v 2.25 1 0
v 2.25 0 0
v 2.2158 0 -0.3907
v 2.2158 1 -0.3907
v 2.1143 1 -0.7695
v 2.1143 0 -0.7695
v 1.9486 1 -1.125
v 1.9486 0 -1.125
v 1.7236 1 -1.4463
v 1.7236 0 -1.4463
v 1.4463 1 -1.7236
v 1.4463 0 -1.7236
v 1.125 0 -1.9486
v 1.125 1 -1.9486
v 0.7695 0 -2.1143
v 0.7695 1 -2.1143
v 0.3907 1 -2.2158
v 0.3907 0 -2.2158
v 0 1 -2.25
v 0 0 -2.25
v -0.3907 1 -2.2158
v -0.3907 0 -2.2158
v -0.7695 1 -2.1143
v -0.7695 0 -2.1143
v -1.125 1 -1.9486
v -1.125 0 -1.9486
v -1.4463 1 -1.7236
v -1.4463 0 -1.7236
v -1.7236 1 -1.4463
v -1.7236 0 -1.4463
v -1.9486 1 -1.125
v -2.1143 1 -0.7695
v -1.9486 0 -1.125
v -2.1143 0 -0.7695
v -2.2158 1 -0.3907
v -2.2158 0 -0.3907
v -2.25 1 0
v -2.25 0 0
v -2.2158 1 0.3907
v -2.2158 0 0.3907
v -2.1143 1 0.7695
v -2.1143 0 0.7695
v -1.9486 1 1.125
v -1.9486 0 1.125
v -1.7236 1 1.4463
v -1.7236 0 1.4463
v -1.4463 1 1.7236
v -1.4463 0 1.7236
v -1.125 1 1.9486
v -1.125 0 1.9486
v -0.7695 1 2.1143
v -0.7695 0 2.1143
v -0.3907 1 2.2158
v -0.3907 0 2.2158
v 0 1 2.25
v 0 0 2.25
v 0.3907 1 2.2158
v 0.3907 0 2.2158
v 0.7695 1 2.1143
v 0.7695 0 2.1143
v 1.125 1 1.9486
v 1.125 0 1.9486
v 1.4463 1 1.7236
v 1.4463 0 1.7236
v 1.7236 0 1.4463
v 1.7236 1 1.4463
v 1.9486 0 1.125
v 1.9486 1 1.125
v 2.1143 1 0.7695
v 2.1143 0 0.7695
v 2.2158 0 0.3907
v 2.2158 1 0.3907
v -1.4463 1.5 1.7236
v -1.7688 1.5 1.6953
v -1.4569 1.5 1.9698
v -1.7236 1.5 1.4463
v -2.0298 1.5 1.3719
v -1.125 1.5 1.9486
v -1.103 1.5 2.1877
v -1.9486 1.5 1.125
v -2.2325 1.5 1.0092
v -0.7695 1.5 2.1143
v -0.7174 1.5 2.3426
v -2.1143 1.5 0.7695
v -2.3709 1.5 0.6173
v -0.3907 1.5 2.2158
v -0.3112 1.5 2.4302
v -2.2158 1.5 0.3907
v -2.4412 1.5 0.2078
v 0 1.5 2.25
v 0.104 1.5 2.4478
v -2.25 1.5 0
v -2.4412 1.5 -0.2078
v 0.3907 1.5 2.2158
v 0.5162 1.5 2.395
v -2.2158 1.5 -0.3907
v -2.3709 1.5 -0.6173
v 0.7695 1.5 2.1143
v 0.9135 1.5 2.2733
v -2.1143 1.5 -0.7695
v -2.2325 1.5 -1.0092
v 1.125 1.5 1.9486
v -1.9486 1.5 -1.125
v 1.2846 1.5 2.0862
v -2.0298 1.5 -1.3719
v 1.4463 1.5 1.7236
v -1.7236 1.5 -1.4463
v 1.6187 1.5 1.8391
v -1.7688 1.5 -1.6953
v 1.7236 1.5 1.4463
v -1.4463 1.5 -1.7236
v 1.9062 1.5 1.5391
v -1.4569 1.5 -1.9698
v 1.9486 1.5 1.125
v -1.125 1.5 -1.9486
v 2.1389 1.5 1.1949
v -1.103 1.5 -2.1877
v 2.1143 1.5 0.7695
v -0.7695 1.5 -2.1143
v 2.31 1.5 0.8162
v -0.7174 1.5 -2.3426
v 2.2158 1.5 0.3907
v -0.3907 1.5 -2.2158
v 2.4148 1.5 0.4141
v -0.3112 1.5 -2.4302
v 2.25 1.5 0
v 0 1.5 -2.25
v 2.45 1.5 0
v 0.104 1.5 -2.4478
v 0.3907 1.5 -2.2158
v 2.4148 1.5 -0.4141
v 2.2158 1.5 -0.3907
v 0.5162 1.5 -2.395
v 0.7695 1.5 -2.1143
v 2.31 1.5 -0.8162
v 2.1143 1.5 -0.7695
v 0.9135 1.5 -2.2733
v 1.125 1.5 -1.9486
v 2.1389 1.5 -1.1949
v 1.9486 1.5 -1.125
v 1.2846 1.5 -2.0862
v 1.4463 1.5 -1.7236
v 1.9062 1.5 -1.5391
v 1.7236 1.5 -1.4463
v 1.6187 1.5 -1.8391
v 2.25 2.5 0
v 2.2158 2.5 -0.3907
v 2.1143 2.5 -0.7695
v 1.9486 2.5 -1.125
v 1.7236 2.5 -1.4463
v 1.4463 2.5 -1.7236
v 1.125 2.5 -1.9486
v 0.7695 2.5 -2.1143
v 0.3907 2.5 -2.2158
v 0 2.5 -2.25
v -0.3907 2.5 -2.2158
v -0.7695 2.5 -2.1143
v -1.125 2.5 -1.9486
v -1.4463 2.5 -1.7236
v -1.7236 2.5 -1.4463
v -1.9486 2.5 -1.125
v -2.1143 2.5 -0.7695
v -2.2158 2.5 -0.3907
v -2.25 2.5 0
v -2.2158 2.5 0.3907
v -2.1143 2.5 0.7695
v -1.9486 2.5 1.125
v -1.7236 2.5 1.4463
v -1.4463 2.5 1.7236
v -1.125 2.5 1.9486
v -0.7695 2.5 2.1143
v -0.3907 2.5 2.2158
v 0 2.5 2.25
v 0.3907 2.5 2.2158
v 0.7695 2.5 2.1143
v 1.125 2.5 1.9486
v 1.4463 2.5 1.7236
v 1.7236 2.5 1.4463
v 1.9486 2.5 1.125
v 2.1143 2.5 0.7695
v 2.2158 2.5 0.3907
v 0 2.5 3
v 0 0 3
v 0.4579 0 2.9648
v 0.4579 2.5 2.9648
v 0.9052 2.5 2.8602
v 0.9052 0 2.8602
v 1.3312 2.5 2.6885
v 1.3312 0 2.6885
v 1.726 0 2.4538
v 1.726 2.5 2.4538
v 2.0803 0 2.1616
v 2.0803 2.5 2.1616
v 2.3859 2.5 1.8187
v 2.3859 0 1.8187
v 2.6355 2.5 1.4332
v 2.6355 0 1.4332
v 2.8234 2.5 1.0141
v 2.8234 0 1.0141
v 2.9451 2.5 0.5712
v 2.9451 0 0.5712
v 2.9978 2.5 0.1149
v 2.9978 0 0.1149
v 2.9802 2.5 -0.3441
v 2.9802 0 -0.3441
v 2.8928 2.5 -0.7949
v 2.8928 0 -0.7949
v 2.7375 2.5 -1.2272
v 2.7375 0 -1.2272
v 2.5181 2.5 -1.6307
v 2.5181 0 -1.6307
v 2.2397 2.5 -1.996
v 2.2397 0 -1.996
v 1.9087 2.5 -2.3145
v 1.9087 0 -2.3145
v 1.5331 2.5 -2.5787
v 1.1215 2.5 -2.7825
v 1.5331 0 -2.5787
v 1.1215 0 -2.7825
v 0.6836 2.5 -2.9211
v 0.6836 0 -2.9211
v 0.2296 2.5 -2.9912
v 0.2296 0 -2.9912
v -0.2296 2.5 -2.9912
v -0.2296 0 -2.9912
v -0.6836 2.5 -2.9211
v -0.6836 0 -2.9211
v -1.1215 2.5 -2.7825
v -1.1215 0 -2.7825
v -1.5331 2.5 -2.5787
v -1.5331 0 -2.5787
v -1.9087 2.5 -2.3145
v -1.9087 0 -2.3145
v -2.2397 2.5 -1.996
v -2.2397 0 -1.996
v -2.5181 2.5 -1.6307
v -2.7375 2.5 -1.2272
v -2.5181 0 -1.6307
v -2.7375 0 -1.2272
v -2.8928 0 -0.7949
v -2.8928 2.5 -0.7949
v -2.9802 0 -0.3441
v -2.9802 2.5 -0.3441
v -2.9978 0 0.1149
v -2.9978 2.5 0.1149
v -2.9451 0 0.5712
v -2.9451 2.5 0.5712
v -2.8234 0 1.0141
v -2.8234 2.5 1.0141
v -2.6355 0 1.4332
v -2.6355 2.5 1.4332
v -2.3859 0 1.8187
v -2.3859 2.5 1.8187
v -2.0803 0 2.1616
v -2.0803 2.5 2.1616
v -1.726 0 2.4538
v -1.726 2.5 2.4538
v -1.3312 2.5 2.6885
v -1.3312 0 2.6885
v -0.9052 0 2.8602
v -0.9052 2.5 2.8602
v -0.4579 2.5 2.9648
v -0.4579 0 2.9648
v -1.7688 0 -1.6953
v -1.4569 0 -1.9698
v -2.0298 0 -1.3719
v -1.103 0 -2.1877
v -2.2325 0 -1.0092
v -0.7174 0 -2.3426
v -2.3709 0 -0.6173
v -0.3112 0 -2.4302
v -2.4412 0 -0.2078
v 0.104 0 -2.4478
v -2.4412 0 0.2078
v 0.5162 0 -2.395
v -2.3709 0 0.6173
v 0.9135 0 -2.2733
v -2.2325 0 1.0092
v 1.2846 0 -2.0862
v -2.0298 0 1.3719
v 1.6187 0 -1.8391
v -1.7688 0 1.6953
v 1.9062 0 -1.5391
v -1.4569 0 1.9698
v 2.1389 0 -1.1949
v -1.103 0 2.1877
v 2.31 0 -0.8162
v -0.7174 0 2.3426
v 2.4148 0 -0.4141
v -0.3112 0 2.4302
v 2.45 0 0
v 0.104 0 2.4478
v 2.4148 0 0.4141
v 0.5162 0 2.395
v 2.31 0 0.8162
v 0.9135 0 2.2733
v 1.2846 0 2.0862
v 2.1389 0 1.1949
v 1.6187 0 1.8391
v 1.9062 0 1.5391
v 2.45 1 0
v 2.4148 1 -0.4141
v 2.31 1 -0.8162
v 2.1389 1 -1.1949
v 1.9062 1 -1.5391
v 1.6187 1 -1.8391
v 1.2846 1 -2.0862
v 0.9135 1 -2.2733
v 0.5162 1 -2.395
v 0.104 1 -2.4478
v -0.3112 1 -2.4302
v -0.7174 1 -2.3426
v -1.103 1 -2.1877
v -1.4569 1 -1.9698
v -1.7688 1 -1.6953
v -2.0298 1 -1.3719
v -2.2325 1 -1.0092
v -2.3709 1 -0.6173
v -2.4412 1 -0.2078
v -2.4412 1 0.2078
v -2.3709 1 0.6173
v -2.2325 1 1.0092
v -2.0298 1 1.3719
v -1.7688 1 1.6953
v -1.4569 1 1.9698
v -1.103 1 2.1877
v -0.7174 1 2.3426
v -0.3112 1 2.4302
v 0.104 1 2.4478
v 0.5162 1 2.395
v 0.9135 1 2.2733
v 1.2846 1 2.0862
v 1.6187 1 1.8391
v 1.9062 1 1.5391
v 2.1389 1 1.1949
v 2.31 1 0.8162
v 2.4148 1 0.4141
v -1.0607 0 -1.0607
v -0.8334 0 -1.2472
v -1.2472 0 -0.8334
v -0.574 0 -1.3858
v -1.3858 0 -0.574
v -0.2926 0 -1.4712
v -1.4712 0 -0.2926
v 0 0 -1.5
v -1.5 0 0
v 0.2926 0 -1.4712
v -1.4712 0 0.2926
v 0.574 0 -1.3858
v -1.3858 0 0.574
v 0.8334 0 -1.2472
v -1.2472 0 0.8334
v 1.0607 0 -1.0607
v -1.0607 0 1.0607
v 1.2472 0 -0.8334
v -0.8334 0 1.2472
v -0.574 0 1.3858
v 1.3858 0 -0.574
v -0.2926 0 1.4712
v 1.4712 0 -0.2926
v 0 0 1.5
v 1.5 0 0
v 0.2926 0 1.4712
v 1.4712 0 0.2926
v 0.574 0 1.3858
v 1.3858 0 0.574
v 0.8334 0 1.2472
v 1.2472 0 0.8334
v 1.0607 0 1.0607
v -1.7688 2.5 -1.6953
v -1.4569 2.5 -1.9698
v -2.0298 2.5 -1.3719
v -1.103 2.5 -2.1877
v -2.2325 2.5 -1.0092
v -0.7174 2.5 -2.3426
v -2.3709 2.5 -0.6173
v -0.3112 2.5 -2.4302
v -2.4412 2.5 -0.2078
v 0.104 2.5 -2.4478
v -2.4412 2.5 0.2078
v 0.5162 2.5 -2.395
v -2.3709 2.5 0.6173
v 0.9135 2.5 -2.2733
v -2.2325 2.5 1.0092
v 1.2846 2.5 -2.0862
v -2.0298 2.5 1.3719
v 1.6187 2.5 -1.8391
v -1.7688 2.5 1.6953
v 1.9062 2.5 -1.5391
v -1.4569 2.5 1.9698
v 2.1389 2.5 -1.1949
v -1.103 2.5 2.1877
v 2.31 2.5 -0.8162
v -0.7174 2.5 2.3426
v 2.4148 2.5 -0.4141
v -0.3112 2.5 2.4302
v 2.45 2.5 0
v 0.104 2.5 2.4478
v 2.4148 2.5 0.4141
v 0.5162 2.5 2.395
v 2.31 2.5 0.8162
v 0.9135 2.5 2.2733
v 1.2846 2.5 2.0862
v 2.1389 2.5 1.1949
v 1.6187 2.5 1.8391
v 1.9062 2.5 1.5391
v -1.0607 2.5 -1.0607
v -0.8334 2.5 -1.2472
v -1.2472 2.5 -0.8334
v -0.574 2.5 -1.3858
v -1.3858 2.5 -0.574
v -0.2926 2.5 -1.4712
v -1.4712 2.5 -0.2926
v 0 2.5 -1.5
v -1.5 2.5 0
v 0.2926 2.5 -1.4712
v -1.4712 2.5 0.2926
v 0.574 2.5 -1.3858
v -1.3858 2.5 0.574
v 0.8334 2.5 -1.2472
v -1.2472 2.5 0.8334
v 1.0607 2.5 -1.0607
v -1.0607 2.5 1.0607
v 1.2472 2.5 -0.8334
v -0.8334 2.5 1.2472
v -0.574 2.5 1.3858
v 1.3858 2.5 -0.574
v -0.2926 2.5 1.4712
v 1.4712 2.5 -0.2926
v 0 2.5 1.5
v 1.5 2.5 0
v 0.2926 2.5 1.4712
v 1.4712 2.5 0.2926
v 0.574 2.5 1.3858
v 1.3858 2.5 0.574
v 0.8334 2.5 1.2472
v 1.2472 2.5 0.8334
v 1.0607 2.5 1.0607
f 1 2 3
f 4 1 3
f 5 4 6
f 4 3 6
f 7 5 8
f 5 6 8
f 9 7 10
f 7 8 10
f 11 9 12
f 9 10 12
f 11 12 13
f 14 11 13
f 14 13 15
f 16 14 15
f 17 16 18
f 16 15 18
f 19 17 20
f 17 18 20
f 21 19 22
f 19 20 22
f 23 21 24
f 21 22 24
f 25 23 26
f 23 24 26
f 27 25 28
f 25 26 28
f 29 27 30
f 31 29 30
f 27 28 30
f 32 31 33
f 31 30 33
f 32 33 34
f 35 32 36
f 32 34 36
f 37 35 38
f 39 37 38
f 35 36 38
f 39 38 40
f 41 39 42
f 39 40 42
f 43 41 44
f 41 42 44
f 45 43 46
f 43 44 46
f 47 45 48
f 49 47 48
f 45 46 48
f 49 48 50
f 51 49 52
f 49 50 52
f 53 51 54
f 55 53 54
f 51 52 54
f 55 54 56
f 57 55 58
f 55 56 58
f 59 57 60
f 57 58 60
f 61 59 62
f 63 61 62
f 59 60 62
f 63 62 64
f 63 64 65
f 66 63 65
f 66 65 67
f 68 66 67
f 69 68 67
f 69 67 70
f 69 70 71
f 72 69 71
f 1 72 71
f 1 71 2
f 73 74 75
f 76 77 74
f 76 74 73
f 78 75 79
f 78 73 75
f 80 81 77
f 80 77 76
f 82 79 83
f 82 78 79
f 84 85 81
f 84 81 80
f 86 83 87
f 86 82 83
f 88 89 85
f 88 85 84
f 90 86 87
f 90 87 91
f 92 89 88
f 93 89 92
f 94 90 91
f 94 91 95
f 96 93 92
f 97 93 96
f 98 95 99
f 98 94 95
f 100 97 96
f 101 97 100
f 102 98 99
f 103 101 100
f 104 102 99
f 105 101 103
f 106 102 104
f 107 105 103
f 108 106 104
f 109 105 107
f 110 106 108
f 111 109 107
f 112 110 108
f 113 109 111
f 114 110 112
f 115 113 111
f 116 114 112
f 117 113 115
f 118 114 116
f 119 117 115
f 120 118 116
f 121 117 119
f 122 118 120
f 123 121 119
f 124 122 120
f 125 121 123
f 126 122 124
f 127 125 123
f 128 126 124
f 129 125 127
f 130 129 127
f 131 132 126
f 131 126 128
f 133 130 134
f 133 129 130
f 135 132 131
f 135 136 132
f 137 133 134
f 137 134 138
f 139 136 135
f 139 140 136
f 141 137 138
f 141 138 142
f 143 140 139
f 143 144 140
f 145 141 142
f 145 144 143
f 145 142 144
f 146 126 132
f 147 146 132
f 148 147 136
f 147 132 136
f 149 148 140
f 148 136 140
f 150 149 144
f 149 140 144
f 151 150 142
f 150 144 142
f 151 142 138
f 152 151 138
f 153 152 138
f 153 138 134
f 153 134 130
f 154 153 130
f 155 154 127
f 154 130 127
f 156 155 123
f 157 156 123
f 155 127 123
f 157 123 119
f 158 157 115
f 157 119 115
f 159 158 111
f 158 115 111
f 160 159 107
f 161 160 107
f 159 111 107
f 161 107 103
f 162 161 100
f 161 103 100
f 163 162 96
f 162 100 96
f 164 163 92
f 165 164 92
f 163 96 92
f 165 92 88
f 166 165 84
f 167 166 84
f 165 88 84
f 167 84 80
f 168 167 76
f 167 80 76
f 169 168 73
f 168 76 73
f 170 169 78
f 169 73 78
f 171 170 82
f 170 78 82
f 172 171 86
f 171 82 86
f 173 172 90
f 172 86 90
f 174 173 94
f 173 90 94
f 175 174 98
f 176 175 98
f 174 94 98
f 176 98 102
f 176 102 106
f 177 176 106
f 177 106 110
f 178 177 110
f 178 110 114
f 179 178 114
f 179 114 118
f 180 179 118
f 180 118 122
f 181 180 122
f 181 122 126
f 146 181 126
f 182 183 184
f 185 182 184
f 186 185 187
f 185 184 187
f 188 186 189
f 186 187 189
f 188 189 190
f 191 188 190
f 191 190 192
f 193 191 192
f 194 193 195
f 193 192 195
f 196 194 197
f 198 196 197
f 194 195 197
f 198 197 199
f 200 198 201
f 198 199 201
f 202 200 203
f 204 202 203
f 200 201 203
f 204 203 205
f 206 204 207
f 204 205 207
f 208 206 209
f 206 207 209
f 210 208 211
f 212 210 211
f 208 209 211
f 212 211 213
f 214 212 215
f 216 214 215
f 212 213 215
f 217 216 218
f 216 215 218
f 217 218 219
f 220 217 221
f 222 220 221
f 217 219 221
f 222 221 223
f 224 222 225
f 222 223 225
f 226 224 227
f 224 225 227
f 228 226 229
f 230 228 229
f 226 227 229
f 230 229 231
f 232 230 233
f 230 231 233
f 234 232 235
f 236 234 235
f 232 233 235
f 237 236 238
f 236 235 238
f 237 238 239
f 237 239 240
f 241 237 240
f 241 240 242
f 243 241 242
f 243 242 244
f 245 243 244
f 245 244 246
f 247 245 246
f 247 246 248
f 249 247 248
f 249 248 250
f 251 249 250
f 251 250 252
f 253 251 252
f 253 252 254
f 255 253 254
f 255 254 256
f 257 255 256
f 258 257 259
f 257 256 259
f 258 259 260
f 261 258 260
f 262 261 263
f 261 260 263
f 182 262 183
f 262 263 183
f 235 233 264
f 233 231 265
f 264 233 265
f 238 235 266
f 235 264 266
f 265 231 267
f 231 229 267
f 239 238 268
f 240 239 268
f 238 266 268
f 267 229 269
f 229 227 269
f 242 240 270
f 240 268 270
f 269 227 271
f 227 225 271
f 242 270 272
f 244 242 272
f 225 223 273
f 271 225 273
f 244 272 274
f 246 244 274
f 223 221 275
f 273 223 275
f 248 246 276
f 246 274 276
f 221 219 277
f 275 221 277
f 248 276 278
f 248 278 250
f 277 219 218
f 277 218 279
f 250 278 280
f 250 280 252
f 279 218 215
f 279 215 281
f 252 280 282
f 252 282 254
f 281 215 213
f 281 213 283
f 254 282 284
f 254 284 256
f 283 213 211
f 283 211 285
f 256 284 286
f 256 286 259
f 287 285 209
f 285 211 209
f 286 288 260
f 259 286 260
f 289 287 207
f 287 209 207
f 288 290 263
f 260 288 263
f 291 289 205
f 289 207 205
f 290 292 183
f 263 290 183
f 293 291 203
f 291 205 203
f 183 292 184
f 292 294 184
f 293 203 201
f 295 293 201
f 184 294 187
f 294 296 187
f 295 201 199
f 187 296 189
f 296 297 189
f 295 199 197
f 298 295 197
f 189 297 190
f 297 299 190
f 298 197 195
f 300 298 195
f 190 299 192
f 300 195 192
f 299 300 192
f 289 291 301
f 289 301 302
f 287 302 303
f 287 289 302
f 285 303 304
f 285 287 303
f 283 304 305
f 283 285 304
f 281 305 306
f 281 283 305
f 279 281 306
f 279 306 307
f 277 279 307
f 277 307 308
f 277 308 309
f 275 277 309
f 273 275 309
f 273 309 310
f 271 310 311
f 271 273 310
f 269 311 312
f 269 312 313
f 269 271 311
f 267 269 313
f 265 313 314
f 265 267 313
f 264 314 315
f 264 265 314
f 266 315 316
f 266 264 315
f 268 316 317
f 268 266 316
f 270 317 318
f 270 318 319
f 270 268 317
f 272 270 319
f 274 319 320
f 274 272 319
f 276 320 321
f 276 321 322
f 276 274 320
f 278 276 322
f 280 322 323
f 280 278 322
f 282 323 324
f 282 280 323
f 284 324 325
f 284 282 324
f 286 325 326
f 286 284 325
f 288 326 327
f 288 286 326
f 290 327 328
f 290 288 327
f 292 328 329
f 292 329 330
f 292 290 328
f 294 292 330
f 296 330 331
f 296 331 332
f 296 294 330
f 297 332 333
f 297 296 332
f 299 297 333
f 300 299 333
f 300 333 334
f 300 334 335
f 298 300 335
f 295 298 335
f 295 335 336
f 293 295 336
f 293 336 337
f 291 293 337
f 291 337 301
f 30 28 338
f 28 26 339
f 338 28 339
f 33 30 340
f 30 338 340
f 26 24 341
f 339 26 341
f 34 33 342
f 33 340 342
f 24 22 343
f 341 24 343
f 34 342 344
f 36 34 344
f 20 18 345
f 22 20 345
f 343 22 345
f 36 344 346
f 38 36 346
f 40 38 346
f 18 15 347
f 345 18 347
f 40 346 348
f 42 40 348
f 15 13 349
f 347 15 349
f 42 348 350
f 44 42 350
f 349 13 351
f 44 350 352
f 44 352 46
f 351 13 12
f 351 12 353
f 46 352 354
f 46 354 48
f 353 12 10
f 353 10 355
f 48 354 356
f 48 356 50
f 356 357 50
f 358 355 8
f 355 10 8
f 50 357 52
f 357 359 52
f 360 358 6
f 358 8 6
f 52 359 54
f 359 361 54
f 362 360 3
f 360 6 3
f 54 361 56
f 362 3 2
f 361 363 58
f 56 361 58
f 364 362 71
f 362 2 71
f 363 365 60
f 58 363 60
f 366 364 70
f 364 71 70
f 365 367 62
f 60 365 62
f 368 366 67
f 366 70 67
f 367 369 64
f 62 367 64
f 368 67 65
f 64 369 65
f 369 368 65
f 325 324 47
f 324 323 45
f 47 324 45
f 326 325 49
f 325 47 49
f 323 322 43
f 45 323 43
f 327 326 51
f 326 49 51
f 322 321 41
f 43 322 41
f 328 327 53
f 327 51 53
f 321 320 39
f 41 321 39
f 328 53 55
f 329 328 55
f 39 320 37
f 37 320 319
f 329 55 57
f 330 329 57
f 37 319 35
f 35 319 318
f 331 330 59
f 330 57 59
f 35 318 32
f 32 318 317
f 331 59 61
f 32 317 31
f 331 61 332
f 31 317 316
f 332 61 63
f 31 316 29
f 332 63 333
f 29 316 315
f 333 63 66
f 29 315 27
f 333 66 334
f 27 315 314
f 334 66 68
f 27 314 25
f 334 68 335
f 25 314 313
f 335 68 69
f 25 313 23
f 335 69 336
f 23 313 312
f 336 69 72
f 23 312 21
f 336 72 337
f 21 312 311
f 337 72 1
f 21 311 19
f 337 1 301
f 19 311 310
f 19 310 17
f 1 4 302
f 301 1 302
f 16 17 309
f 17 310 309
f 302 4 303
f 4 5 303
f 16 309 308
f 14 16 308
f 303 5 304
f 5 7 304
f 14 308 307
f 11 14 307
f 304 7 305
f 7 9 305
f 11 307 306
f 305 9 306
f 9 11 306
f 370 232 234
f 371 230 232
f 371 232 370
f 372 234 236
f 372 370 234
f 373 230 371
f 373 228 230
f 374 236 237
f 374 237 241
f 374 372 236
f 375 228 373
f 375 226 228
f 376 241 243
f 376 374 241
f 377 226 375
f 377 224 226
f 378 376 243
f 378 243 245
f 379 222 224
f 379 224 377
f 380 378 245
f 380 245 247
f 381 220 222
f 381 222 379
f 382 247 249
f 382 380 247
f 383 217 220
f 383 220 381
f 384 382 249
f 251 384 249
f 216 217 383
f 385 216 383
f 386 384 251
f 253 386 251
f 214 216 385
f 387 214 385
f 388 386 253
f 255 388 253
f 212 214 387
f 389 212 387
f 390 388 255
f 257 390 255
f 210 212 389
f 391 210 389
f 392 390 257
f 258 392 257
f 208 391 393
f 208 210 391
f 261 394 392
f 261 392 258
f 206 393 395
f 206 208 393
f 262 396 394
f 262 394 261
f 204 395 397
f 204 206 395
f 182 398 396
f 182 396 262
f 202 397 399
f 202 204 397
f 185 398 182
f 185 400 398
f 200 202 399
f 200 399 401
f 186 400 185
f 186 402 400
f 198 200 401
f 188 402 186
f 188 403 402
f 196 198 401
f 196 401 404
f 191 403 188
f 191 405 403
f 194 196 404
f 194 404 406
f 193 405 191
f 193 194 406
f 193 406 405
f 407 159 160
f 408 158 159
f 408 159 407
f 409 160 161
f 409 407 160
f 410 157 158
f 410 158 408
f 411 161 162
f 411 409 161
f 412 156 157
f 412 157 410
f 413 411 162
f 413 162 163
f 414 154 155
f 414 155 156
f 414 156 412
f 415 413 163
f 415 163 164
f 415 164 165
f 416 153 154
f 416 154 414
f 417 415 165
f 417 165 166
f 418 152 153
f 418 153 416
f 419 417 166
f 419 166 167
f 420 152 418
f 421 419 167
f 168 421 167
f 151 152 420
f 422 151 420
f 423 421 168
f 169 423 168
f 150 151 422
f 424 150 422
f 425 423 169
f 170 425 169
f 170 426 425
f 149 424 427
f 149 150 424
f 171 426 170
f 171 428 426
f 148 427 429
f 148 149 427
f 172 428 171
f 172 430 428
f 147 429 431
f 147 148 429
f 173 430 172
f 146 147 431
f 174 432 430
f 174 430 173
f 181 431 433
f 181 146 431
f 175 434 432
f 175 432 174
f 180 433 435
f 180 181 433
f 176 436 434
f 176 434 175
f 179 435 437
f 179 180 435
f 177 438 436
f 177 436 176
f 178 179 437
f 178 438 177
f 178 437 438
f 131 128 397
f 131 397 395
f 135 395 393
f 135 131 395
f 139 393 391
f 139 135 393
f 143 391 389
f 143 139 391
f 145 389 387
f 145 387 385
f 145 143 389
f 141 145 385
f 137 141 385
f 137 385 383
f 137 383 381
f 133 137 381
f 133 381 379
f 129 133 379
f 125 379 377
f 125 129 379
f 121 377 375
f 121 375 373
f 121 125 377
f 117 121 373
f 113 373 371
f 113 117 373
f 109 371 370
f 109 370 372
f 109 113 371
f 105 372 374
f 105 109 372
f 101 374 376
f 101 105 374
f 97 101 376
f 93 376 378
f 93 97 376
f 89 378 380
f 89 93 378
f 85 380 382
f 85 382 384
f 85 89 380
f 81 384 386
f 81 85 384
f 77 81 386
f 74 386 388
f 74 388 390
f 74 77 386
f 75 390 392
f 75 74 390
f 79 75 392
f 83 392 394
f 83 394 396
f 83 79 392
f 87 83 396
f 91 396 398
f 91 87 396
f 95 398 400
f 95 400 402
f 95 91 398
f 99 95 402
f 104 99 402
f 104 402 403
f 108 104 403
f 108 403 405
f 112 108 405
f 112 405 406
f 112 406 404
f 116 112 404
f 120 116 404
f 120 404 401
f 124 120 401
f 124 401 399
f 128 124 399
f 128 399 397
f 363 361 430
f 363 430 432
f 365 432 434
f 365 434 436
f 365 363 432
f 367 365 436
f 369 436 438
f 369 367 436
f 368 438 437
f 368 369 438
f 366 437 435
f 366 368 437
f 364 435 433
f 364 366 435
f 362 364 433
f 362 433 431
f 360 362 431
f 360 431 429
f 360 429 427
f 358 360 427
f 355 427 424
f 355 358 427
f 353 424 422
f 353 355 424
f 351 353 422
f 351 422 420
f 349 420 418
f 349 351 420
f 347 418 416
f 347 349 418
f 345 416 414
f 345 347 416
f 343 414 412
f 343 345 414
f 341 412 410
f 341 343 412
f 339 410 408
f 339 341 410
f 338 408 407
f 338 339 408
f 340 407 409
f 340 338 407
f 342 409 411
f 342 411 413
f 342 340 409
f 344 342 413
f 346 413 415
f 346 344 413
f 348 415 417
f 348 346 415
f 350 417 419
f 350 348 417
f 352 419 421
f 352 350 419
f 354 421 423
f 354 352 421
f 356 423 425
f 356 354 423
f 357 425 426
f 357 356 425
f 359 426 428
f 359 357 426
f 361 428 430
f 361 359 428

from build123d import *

# Parameters (mm, degrees)
SKETCH_1_R          = 3
SKETCH_1_R_2        = 1.5
EXTRUDE_1_DEPTH     = 2.5
SKETCH_1_3_R        = 2.45
SKETCH_1_3_R_2      = 2.25
CUT_EXTRUDE_1_DEPTH = 1
CUT_EXTRUDE_START   = 1.5
SKETCH_1_4_R        = 2.45
SKETCH_1_4_R_2      = 2.25
CUT_EXTRUDE_2_DEPTH = 1


with BuildPart() as part:
    # 草图1 → 凸台-拉伸1 (new body)
    with BuildSketch(Plane(origin=(0, 0, 0), x_dir=(1, 0, 0), z_dir=(0, 1, 0))):
        with Locations(Location((0, 0, 0), (0, 0, 270))):
            Circle(SKETCH_1_R)
        with Locations(Location((0, 0, 0), (0, 0, 270))):
            Circle(SKETCH_1_R_2, mode=Mode.SUBTRACT)
    extrude(amount=EXTRUDE_1_DEPTH)

    # 草图1<3> → 切除-拉伸-薄壁1 (cut)
    with BuildSketch(Plane(origin=(0, 0, 0), x_dir=(1, 0, 0), z_dir=(0, 1, 0))):
        Circle(SKETCH_1_3_R)
        Circle(SKETCH_1_3_R_2, mode=Mode.SUBTRACT)
    extrude(amount=CUT_EXTRUDE_1_DEPTH, mode=Mode.SUBTRACT)

    # 草图1<4> → 切除-拉伸-薄壁2 (cut)
    with BuildSketch(Plane(origin=(0, 0, 0), x_dir=(1, 0, 0), z_dir=(0, 1, 0)).offset(CUT_EXTRUDE_START)):
        Circle(SKETCH_1_4_R)
        Circle(SKETCH_1_4_R_2, mode=Mode.SUBTRACT)
    extrude(amount=CUT_EXTRUDE_2_DEPTH, mode=Mode.SUBTRACT)


solid = part.part
